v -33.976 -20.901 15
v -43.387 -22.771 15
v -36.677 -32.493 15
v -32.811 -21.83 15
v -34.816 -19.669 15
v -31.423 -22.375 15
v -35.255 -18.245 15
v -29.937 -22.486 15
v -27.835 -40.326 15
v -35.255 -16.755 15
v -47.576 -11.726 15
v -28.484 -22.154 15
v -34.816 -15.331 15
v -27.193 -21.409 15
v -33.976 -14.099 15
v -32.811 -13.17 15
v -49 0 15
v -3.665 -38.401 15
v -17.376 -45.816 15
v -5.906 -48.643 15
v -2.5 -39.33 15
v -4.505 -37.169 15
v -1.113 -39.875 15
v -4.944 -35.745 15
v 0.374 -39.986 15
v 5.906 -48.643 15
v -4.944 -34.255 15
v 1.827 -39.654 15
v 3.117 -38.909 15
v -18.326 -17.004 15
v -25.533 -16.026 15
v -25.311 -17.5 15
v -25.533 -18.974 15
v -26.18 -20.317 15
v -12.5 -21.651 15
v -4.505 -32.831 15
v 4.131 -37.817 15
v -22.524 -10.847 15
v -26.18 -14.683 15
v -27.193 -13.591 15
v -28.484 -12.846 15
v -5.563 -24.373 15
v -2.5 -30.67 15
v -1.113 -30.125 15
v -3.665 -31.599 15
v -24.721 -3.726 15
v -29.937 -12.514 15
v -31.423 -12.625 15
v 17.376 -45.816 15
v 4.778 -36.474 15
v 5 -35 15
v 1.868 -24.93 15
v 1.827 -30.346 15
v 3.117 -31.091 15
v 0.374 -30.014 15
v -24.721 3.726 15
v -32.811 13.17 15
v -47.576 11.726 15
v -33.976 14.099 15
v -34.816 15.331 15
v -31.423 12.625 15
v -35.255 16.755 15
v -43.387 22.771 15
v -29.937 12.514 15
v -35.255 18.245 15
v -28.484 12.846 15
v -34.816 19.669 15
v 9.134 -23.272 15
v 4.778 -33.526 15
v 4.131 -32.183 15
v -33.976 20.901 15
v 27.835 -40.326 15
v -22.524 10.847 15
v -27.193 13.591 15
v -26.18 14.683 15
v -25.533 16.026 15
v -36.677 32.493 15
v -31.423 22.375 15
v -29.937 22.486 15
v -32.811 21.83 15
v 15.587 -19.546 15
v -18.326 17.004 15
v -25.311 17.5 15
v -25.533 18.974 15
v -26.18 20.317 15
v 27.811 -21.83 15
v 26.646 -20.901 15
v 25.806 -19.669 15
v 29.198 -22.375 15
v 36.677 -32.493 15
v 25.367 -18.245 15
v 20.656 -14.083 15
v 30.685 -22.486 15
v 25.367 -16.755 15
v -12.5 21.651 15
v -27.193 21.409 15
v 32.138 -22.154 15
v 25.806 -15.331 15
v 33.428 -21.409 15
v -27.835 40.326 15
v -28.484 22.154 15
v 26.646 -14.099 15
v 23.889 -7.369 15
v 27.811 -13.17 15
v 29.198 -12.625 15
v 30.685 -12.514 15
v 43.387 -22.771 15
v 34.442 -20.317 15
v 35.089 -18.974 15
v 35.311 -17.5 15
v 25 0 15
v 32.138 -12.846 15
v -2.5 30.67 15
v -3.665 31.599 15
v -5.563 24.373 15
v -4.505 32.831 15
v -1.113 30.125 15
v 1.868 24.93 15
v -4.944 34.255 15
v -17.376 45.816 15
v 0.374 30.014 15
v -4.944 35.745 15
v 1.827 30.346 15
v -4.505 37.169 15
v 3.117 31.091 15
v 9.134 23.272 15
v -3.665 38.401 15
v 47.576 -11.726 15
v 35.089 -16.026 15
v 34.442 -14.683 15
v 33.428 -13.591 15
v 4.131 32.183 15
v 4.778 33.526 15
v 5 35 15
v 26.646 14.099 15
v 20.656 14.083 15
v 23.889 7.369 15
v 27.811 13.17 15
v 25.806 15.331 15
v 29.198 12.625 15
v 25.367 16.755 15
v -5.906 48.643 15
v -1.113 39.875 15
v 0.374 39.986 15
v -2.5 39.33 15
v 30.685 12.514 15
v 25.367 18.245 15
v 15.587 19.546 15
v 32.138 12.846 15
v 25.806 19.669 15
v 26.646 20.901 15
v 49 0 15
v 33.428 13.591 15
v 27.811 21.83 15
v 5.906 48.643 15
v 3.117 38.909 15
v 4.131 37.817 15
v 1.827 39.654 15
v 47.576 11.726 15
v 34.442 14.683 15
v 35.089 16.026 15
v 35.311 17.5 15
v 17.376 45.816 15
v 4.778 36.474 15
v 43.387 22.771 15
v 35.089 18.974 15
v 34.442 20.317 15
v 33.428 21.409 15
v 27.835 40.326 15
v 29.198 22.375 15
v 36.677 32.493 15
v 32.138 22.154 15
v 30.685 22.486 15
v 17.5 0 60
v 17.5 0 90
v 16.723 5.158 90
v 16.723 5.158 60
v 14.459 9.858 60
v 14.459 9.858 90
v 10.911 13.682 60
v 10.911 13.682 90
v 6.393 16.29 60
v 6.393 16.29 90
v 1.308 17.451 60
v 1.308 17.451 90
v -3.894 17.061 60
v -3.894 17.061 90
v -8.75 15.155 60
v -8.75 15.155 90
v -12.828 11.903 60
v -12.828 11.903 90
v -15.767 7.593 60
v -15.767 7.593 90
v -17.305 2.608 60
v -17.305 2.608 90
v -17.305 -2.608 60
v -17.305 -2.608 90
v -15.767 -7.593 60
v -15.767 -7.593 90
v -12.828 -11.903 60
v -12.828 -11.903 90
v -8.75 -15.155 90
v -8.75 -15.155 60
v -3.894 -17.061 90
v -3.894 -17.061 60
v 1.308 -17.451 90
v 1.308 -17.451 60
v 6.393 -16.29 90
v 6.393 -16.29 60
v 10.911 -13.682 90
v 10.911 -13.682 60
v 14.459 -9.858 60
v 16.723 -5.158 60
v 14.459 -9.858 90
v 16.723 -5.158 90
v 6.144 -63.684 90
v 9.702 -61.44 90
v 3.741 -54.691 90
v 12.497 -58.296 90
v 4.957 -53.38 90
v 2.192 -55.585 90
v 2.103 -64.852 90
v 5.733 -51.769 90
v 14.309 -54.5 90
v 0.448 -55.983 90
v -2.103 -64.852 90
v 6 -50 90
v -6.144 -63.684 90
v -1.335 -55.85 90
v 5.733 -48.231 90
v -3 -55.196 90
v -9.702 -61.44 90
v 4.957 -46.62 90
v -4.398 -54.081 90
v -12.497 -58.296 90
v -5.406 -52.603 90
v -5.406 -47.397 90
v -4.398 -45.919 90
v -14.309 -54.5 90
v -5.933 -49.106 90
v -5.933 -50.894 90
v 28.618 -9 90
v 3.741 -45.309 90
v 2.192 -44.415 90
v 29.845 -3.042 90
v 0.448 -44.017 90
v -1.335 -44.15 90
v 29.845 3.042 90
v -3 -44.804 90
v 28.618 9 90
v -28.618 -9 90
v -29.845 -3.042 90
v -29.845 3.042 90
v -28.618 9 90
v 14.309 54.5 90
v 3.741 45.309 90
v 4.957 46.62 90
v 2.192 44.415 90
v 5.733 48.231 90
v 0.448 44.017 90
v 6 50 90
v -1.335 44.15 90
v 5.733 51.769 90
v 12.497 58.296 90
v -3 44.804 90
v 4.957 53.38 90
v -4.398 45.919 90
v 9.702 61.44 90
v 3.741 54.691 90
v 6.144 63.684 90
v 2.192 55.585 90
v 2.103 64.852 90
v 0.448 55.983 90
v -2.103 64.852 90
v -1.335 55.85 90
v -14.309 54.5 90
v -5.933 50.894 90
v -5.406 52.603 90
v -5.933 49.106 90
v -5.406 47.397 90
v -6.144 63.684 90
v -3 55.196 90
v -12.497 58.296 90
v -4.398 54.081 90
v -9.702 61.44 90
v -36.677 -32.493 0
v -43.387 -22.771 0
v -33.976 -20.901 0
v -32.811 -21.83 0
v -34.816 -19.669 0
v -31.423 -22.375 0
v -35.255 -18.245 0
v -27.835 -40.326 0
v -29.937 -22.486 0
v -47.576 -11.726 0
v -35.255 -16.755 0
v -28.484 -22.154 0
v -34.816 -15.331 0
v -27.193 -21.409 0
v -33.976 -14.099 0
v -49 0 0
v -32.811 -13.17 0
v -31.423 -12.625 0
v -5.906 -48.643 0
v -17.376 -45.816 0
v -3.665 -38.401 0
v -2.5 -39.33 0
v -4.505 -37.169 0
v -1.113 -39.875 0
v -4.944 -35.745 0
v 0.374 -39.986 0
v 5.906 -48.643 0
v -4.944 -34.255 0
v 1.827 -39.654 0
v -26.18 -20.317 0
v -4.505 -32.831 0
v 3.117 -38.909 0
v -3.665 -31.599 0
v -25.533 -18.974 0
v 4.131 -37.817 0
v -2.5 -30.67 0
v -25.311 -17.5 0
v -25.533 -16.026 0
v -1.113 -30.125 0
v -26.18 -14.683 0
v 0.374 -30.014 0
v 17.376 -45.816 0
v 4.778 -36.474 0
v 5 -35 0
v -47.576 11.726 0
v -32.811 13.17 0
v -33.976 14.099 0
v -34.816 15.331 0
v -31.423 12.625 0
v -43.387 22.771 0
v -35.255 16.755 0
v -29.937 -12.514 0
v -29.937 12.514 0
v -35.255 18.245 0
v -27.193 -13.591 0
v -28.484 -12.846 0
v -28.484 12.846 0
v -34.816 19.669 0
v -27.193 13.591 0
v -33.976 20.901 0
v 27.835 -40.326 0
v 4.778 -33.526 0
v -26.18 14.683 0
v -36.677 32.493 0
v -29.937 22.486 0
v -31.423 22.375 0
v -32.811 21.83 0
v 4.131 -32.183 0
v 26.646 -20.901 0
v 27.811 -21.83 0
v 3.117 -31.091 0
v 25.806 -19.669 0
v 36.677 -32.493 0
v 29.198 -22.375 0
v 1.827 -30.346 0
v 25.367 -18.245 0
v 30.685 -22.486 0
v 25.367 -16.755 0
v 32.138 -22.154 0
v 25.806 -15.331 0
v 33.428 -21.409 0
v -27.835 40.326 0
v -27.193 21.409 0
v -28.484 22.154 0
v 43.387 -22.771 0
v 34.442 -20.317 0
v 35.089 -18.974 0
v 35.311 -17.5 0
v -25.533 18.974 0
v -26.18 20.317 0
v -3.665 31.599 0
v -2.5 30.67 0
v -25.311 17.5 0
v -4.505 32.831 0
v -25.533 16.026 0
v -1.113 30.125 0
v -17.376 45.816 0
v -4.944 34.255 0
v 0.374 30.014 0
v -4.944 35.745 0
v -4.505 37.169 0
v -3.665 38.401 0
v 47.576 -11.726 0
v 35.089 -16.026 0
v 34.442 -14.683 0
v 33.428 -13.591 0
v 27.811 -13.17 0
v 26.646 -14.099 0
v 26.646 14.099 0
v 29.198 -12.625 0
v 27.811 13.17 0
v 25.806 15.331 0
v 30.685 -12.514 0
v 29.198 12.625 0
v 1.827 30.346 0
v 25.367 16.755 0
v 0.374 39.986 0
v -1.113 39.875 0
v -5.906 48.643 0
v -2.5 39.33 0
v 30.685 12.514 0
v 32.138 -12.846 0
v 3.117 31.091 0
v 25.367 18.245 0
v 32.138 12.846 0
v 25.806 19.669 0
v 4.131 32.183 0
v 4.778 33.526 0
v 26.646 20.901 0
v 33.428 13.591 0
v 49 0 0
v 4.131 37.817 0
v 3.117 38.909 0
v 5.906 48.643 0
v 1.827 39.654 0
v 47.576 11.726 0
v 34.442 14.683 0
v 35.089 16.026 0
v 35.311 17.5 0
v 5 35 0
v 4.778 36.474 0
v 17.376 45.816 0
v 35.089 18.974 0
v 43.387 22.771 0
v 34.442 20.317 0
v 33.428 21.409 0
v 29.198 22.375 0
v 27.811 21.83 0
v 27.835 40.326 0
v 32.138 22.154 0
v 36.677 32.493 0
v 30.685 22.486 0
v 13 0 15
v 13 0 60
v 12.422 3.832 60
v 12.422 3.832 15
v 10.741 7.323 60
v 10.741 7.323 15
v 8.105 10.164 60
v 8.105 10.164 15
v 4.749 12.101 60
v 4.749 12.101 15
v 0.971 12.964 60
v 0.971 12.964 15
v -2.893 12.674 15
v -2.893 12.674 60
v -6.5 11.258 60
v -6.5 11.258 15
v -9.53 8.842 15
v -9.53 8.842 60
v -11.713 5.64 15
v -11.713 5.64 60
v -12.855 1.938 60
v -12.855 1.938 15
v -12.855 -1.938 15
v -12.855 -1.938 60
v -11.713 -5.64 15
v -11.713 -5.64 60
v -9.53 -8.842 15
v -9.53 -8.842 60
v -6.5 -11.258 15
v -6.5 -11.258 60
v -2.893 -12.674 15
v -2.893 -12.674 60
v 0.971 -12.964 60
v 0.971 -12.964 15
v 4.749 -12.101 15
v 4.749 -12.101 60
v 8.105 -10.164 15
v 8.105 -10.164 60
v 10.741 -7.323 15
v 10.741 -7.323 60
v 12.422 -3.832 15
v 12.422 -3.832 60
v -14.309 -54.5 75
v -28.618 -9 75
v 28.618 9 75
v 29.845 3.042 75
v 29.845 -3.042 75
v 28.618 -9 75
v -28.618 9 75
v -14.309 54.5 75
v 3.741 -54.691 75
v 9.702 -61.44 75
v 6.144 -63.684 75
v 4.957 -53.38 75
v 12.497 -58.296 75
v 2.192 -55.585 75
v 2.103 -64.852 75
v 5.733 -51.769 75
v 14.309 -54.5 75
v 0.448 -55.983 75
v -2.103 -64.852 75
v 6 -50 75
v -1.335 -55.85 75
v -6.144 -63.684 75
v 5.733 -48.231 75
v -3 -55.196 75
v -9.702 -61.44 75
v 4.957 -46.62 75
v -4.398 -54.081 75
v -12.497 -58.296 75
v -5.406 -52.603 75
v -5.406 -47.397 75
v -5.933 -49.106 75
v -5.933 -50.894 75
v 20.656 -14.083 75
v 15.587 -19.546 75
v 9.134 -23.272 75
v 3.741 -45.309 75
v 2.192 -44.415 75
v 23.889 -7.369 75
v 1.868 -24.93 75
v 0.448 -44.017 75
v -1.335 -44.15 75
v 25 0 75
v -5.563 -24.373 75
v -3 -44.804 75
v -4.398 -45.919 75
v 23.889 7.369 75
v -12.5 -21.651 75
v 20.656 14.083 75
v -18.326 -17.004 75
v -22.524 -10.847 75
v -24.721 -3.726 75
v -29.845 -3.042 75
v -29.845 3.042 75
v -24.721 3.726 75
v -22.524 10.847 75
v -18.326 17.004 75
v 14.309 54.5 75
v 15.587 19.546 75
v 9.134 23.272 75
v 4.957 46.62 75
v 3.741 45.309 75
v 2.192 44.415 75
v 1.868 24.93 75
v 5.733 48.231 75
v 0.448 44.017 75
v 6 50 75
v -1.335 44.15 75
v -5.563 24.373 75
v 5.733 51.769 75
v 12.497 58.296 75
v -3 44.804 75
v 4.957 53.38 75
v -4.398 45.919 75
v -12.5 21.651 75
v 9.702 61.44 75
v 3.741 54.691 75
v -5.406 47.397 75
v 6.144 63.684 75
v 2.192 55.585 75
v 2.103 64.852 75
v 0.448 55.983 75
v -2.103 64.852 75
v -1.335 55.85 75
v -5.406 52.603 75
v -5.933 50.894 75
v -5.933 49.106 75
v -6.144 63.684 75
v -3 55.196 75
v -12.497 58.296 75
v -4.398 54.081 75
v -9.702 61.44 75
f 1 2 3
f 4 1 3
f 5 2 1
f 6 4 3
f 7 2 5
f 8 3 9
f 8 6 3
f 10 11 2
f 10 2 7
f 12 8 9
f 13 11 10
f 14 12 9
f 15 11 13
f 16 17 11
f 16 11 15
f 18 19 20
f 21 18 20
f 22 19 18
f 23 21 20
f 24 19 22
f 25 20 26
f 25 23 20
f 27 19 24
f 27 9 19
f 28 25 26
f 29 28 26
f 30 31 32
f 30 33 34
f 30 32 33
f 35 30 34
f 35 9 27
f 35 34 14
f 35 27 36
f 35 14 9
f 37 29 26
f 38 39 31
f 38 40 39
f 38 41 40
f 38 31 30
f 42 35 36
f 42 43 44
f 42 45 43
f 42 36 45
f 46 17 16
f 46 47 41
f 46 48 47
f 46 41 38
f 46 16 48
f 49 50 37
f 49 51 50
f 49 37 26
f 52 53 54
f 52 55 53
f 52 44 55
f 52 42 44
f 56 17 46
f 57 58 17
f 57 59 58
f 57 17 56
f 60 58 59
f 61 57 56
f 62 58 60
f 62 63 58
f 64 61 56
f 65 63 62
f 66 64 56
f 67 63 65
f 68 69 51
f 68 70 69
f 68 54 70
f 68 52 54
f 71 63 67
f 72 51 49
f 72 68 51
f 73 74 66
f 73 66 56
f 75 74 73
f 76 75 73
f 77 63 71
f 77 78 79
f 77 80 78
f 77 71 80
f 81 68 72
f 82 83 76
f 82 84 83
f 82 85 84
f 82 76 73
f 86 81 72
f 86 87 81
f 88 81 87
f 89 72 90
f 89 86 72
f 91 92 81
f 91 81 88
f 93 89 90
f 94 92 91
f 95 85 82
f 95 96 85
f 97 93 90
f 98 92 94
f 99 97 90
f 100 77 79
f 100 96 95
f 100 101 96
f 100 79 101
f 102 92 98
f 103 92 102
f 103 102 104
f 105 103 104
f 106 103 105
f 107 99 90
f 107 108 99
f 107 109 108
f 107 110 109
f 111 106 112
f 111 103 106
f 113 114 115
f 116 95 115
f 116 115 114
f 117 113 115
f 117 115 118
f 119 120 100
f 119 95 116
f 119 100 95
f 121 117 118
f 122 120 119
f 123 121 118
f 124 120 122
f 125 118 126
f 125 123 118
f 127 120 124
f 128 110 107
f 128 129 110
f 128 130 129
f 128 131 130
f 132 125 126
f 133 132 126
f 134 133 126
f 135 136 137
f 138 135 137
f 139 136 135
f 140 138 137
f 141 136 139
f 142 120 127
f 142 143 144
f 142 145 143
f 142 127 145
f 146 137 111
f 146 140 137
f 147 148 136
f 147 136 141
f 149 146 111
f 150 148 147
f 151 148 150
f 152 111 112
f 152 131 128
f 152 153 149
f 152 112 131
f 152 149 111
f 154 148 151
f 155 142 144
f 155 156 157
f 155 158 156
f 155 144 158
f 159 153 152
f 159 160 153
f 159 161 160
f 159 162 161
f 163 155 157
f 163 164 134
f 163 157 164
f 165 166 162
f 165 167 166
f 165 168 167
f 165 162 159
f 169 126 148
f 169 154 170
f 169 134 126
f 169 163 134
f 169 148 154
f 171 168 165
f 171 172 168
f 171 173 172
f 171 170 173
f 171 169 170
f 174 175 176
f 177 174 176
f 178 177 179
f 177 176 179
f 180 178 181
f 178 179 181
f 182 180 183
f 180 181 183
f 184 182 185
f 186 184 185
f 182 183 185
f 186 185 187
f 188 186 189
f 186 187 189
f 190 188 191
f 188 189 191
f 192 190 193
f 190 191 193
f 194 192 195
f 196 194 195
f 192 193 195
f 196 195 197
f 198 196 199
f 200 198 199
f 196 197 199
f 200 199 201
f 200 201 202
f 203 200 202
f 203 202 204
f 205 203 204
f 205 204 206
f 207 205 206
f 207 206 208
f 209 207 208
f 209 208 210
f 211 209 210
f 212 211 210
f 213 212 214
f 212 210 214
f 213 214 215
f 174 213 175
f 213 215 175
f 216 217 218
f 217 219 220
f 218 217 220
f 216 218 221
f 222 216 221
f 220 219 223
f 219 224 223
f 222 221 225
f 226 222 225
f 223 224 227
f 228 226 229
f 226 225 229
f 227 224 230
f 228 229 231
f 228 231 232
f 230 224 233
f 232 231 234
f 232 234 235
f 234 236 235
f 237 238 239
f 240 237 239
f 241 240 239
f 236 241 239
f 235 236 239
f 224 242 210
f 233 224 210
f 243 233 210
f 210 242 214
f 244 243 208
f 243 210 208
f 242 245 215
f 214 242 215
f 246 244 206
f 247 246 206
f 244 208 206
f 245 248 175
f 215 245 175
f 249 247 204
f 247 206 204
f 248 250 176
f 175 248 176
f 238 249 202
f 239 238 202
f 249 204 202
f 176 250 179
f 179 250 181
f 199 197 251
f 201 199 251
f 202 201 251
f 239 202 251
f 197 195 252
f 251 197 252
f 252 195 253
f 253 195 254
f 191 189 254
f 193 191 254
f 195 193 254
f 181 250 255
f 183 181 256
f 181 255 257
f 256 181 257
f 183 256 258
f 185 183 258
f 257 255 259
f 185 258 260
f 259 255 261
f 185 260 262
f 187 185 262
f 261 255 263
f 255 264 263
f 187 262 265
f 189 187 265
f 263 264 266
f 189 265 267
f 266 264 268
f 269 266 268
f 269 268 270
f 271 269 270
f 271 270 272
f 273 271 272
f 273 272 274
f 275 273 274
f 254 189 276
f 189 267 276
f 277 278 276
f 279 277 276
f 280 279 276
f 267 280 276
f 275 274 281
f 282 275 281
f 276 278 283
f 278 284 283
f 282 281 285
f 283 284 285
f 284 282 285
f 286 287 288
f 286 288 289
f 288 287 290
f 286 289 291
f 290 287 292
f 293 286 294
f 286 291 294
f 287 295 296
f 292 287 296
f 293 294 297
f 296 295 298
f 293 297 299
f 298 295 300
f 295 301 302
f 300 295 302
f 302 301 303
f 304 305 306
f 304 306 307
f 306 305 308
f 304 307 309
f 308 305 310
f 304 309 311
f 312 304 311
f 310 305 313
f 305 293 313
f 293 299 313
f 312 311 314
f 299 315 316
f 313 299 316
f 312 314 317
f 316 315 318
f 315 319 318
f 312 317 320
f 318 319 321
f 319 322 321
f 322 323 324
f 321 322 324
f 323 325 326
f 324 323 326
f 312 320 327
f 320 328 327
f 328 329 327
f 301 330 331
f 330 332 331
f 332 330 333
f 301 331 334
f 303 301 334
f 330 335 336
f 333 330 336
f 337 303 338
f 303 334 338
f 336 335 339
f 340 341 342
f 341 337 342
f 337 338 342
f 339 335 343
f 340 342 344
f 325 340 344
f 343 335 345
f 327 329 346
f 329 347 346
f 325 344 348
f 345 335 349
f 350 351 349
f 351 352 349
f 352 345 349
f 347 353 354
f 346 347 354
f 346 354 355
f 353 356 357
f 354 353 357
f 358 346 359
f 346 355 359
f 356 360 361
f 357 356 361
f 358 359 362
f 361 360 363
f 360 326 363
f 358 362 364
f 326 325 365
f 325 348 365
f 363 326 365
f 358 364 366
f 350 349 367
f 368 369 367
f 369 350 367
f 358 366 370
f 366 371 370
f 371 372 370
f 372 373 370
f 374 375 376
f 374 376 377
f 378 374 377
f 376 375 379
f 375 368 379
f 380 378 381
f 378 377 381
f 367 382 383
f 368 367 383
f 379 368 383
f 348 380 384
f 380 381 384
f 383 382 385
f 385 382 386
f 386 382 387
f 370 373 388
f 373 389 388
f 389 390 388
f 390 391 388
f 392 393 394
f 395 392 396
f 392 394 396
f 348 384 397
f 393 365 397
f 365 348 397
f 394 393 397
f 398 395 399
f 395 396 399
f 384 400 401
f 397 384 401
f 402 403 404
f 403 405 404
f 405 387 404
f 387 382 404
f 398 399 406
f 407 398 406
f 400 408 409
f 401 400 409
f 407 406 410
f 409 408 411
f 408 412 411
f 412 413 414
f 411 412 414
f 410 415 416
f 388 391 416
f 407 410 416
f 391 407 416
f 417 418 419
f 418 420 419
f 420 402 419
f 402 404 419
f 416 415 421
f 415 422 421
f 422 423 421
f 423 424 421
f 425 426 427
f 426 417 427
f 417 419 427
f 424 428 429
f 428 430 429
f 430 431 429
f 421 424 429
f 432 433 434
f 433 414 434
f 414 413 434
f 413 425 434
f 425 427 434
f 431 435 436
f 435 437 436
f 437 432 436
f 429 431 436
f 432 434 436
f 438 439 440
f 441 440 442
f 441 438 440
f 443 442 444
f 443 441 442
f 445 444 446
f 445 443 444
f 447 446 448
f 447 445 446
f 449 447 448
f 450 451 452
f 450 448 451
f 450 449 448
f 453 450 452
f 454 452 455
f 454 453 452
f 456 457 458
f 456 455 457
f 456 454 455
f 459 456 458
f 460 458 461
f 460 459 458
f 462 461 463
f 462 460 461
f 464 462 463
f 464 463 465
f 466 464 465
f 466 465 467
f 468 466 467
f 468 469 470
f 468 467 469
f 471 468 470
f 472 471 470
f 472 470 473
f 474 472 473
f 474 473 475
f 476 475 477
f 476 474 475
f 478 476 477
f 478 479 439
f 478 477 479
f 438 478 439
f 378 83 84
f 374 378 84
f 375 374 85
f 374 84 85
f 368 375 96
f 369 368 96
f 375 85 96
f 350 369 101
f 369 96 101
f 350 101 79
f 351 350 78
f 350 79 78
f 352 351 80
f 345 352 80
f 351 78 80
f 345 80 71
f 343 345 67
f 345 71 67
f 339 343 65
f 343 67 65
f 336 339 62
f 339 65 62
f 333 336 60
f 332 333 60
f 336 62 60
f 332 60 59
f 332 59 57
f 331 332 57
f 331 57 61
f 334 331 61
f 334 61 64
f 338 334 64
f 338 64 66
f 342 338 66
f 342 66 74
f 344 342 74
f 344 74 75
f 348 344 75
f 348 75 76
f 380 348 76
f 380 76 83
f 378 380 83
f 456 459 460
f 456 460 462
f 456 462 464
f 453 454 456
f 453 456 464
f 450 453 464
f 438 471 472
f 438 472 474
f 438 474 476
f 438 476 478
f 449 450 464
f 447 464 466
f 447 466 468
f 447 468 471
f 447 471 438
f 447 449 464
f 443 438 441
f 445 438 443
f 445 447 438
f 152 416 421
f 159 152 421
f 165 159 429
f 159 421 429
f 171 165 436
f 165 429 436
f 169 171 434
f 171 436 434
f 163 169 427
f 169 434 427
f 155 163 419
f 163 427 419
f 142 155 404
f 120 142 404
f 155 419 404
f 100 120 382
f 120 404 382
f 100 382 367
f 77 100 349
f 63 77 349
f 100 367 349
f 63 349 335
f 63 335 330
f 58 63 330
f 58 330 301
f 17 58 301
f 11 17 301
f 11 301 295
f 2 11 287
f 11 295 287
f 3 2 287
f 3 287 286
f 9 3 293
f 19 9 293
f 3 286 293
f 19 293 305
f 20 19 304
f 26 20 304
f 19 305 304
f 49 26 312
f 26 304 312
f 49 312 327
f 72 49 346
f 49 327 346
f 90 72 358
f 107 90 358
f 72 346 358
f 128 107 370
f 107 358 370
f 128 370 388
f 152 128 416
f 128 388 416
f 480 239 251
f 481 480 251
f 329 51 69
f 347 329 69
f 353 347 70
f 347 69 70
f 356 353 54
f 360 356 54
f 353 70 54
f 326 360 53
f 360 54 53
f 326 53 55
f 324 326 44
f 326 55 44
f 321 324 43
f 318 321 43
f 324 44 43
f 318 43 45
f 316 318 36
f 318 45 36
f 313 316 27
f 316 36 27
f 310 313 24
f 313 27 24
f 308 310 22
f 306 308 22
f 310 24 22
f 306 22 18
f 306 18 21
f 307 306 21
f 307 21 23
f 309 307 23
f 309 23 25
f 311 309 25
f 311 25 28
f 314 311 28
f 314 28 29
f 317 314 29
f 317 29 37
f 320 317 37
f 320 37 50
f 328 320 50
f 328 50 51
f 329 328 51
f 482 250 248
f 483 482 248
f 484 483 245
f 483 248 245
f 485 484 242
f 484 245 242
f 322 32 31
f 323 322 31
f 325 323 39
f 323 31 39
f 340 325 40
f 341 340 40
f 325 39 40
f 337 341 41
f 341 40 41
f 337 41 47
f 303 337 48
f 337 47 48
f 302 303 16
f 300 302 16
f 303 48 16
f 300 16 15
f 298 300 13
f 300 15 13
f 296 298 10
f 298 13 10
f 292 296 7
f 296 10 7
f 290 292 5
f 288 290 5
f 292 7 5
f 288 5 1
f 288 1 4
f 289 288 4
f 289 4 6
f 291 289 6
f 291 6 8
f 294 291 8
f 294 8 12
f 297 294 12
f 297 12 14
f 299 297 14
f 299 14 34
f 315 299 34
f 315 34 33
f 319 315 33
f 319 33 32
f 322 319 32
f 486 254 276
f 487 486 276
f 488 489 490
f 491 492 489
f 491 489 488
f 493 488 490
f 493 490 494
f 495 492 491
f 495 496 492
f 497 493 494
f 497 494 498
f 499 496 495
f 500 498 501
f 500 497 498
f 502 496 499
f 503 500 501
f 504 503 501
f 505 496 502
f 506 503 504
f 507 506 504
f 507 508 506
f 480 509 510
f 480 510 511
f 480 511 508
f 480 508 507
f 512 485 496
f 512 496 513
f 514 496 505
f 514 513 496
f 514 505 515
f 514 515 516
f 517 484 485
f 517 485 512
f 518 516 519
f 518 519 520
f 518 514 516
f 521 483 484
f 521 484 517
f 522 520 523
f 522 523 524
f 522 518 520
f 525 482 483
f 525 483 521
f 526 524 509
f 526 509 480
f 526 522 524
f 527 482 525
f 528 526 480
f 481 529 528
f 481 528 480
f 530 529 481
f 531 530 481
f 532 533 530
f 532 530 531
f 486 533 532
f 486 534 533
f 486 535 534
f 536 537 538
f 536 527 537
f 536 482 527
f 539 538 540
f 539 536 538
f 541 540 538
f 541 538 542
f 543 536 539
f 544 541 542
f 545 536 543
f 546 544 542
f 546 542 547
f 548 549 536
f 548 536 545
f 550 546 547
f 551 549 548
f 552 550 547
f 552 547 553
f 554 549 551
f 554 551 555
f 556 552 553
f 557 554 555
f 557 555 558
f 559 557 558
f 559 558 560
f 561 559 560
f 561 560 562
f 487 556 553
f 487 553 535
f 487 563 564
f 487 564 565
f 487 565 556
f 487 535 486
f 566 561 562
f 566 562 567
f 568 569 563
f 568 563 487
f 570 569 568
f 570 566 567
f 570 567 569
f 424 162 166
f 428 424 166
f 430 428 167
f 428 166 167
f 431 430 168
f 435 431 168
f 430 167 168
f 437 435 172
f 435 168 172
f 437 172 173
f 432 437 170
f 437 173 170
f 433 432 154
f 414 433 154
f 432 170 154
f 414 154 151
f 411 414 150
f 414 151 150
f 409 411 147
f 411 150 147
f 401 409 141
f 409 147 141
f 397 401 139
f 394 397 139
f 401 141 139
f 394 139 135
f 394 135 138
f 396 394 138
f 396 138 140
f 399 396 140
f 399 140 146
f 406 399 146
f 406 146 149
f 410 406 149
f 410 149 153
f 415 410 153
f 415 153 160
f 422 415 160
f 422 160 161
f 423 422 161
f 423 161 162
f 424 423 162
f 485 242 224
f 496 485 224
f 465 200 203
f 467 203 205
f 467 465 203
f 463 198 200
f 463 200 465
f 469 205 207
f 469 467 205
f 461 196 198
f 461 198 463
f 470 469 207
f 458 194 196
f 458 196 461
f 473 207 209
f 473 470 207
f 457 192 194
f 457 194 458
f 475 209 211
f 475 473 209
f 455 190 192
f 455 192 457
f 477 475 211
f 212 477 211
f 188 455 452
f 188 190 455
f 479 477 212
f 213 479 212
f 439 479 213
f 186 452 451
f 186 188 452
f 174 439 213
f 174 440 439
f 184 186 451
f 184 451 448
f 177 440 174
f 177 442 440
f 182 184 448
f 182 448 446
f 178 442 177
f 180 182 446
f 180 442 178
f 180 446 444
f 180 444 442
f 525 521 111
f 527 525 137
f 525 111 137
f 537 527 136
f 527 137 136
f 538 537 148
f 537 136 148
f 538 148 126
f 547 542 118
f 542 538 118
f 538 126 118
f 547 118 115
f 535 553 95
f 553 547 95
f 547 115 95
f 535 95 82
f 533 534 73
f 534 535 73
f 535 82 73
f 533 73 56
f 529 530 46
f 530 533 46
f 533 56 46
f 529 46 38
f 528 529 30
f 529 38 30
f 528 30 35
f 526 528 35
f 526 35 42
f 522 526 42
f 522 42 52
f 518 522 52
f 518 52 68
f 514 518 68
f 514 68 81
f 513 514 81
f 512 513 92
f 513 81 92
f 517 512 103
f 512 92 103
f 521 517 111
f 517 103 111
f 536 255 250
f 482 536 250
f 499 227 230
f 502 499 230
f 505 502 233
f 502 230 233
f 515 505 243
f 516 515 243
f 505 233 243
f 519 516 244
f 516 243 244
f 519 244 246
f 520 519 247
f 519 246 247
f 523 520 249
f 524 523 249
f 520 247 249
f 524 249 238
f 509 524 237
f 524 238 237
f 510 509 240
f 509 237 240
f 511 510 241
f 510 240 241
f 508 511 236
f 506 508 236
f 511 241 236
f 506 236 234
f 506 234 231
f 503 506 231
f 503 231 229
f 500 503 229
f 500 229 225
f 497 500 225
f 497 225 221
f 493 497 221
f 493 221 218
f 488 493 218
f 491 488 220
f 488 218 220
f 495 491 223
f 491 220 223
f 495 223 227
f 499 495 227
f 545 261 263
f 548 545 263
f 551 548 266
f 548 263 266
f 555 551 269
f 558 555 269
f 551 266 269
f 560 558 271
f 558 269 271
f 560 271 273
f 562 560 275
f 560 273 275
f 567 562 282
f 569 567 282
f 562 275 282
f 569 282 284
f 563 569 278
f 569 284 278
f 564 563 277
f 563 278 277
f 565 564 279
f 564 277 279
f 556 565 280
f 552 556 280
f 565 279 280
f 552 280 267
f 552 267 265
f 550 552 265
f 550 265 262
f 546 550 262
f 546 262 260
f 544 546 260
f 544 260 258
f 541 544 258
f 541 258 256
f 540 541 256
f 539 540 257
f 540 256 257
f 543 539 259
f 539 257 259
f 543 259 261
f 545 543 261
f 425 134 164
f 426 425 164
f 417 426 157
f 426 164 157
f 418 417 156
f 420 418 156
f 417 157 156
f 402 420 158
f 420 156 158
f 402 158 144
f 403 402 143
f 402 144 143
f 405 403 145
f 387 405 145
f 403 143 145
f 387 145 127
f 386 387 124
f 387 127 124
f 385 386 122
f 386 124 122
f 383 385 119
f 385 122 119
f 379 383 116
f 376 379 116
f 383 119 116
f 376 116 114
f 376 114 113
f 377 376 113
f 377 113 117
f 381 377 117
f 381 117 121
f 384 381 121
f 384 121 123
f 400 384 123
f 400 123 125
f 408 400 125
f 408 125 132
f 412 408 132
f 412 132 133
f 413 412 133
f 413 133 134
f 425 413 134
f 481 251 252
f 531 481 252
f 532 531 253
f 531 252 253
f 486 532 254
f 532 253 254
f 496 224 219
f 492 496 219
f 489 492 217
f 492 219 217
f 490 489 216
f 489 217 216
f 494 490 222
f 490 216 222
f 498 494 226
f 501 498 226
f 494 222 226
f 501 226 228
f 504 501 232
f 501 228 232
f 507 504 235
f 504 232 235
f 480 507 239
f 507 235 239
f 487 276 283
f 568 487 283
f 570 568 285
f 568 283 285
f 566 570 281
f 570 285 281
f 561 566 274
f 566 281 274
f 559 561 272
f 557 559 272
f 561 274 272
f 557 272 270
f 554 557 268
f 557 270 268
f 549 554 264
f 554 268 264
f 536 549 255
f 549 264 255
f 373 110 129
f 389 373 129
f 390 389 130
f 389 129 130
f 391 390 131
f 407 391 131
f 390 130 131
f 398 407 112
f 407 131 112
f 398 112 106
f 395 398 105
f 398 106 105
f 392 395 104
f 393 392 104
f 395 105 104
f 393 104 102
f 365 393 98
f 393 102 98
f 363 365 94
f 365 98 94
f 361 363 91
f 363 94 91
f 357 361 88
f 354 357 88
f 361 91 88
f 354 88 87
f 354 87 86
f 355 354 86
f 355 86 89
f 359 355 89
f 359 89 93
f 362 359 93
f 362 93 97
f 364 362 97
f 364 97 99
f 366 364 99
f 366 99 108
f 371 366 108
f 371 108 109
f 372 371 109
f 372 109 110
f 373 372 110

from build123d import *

# Parameters (mm, degrees)
CROQUIS1_R              = 49
SALIENTE_EXTRUIR1_DEPTH = 15
CROQUIS2_R              = 5
CORTAR_EXTRUIR1_DEPTH   = 71.901339903
CROQUIS3_R              = 25
CROQUIS3_R_2            = 13
SALIENTE_EXTRUIR2_DEPTH = 75
CROQUIS4_R              = 6
SALIENTE_EXTRUIR3_DEPTH = 15
CROQUIS5_R              = 17.5
CORTAR_EXTRUIR2_DEPTH   = 30


with BuildPart() as part:
    # Croquis1 → Saliente-Extruir1 (new body)
    with BuildSketch(Plane.XY):
        Circle(CROQUIS1_R)
    extrude(amount=SALIENTE_EXTRUIR1_DEPTH)

    # Croquis2 → Cortar-Extruir1 (cut, through all)
    with BuildSketch(Plane.XY.offset(15)):
        with Locations((0, 35)):
            Circle(CROQUIS2_R)
        with Locations((30.310889132, 17.5)):
            Circle(CROQUIS2_R)
        with Locations((30.310889132, -17.5)):
            Circle(CROQUIS2_R)
        with Locations((0, -35)):
            Circle(CROQUIS2_R)
        with Locations((-30.310889132, -17.5)):
            Circle(CROQUIS2_R)
        with Locations((-30.310889132, 17.5)):
            Circle(CROQUIS2_R)
    extrude(amount=-CORTAR_EXTRUIR1_DEPTH, mode=Mode.SUBTRACT)

    # Croquis3 → Saliente-Extruir2 (add)
    with BuildSketch(Plane.XY.offset(15)):
        Circle(CROQUIS3_R)
        Circle(CROQUIS3_R_2, mode=Mode.SUBTRACT)
    extrude(amount=SALIENTE_EXTRUIR2_DEPTH)

    # Croquis4 → Saliente-Extruir3 (add)
    with BuildSketch(Plane.XY.offset(90)):
        with BuildLine():
            Line((14.309088021, 54.5), (28.618176043, 9))
            ThreePointArc((28.618176043, 9), (30, 0), (28.618176043, -9))
            Line((28.618176043, -9), (14.309088021, -54.5))
            ThreePointArc((14.309088021, -54.5), (0, -65), (-14.309088021, -54.5))
            Line((-14.309088021, -54.5), (-28.618176043, -9))
            ThreePointArc((-28.618176043, -9), (-30, 0), (-28.618176043, 9))
            Line((-28.618176043, 9), (-14.309088021, 54.5))
            ThreePointArc((-14.309088021, 54.5), (0, 65), (14.309088021, 54.5))
        make_face()
        with Locations((0, 50)):
            Circle(CROQUIS4_R, mode=Mode.SUBTRACT)
        with Locations((0, -50)):
            Circle(CROQUIS4_R, mode=Mode.SUBTRACT)
    extrude(amount=-SALIENTE_EXTRUIR3_DEPTH)

    # Croquis5 → Cortar-Extruir2 (cut)
    with BuildSketch(Plane.XY.offset(90)):
        Circle(CROQUIS5_R)
    extrude(amount=-CORTAR_EXTRUIR2_DEPTH, mode=Mode.SUBTRACT)


solid = part.part
